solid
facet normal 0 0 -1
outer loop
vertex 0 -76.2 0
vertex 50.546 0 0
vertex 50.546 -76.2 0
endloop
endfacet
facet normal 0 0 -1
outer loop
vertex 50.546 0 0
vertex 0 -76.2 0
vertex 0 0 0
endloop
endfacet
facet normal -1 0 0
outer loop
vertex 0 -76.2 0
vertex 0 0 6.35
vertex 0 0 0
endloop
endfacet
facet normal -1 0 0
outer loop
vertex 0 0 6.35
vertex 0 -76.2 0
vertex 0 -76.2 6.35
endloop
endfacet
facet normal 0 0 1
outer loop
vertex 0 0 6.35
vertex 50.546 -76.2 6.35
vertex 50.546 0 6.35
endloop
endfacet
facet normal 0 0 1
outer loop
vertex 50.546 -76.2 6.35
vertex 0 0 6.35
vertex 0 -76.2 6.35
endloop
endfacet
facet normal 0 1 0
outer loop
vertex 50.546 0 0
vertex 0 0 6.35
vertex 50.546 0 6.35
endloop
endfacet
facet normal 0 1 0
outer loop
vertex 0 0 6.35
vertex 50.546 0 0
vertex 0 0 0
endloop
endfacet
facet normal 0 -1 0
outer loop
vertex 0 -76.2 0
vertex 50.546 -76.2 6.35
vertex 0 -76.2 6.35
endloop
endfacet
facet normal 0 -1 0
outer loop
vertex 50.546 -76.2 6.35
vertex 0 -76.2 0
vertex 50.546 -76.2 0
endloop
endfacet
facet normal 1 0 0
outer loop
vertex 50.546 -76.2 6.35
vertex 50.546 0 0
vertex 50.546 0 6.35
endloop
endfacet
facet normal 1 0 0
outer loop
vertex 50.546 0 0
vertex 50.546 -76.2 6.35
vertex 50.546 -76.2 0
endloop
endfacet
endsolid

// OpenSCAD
//OpenScadFont

//Author: Steve Miller (avrgeek on Thingiverse)
//http://www.thingiverse.com/thing:6820

/*

Usage: fnt_str(chars,char_count, block_size, height)
Example fnt_str(["H","e","l","l","o"],5,1,3);

This provides an alternate method of embedding lettering into an OpenSCAD project.  An 
open source font is exported into dxf files, and those files are linear_extruded to provide nicely 
rendered fonts.  The code is based on the bitmap font module 
(http://www.thingiverse.com/thing:2054).  The function provided by the fnt_str will map to the 
8bit_str moudule.  The block-size parameter will have no effect on the generated size of the letters.  
Make sure the "fnt-LeagueGothic" directory is contained within the directory for your project.

The font use was League Gothic from the League of Moveable Type 
(http://www.theleagueofmoveabletype.com/fonts/7-league-gothic)  This font does have variable width,
so some of the letters may look out of place.  Some manual adjustments have been made, but
OpenSCAD's immutable variables makes calculating the proper spacing difficult.  Perhaps a 
smarter person has a way of pulling this off.

Other fonts can be adapted to this module.  The Customize.txt file will contain basic instructions for
porting new fonts.



*/

/*
This work is licensed under the Creative Commons Attribution-ShareAlike 3.0 Unported License. To view a copy of this license, visit http://creativecommons.org/licenses/by-sa/3.0/; or, (b) send a letter to Creative Commons, 171 2nd Street, Suite 300, San Francisco, California, 94105, USA.
*/

//Variables
fnt_directory="fnt-LeagueGothic/";

//Test module for 
module fnt_str(chars,char_count, block_size, height) {
   //Block-size will be effectly ignored for now...may try to do something with it in the future
   char_width=5;
   echo(str("Total Width: ", char_width*char_count, "mm"));

   //Trans
   union() {
     for (count = [0:char_count-1]) {
      translate(v = [5,-2.5+count * char_width, 0])
        rotate([0,0,90]) fnt_char(chars[count], block_size, height);
     }

   }

}

module getChar(dxfString="0.dxf", height=5,scaleValue=[1,1,1]){
	//echo("Height of letter ",height);
	scale(scaleValue){
			linear_extrude(height=height, convexity=10){
				import(file=str(fnt_directory,dxfString));
			}
	}
}

module fnt_char(char, block_size, height, include_base,scaleValue=[8,8,1]) {
  //TODO: Adjust scaling factors, determine correct "block" size.
  if (char == "0") {
	  getChar("0.dxf", height,scaleValue);
  } else if (char == "1") {
	  getChar("1.dxf", height,scaleValue);
  } else if (char == "2") {
	  getChar("2.dxf", height,scaleValue);
  } else if (char == "3") {
	  getChar("3.dxf", height,scaleValue);
  } else if (char == "4") {
	  getChar("4.dxf", height,scaleValue);
  } else if (char == "5") {
	  getChar("5.dxf", height,scaleValue);
  } else if (char == "6") {
	  getChar("6.dxf", height,scaleValue);
  } else if (char == "7") {
	  getChar("7.dxf", height,scaleValue);
  } else if (char == "8") {
	  getChar("8.dxf", height,scaleValue);
  } else if (char == "9") {
	  getChar("9.dxf", height,scaleValue);
  } else if (char == "a") {
	  getChar("a-lower.dxf", height,scaleValue);
  } else if (char == "A") {
	  getChar("A.dxf", height,scaleValue);
  } else if (char == "&") {
	  getChar("amperstand.dxf", height,scaleValue);
  } else if (char == "*") {
    translate([0,2,0]) 
    		getChar("asterisk.dxf", height,scaleValue);
  } else if (char == "\\") {
	  getChar("backslash.dxf", height,scaleValue);
  } else if (char == "|") {
    translate([1.7,0,0])
    		getChar("bar.dxf", height,scaleValue);
  } else if (char == "b") {
	  getChar("b-lower.dxf", height,scaleValue);
  } else if (char == "B") {
	  getChar("B.dxf", height,scaleValue);
  } else if (char == "c") {
	  getChar("c-lower.dxf", height,scaleValue);
  } else if (char == "C") {
	  getChar("C.dxf", height,scaleValue);
  } else if (char == "-") {
    translate([1.7,4,0]) 
    		getChar("dash.dxf", height,scaleValue);
  } else if (char == "d") {
	  getChar("d-lower.dxf", height,scaleValue);
  } else if (char == "D") {
	  getChar("D.dxf", height,scaleValue);
  } else if (char == "$") {
    translate([0,-1.5,0]) 
		getChar("dollarsign.dxf", height,[scaleValue[0]-1,scaleValue[1],scaleValue[2]]);
  } else if (char == ".") {
	  getChar("dot.dxf", height,scaleValue);
  } else if (char == "''") {
    translate([0,6,0]) 
    		getChar("doublequote.dxf", height,scaleValue);
  } else if (char == "=") {
    translate([0,2.5,0]) 
				getChar("=.dxf", height,[scaleValue[0]-2,scaleValue[1],scaleValue[2]]);
  } else if (char == "_") {
	  getChar("_.dxf", height,[scaleValue[0]-2,scaleValue[1],scaleValue[2]]);
  } else if (char == ",") {
    translate([0,-1.75,0]) 
    		getChar(",.dxf", height,scaleValue);
  } else if (char == ":") {
	  getChar(":.dxf", height,scaleValue);
  } else if (char == "!") {
	  getChar("!.dxf", height,scaleValue);
  } else if (char == "(") {
	  getChar("openpar.dxf", height,scaleValue);
  } else if (char == ")") {
	  getChar("closepar.dxf", height,scaleValue);
  } else if (char == "[") {
	  getChar("[.dxf", height,scaleValue);
  } else if (char == "]") {
	  getChar("].dxf", height,scaleValue);
  } else if (char == "@") {
	  getChar("@.dxf", height,scaleValue);
  } else if (char == "#") {
	  getChar("#.dxf", height,[scaleValue[0]-3,scaleValue[1],scaleValue[2]]);
  } else if (char == "+") {
    translate([0,2,0]) 
    		getChar("+.dxf", height,scaleValue);
  } else if (char == "e") {
	  getChar("e-lower.dxf", height,scaleValue);
  } else if (char == "E") {
	  getChar("E.dxf", height,scaleValue);
  } else if (char == "f") {
	  getChar("f-lower.dxf", height,scaleValue);
  } else if (char == "F") {
	  getChar("F.dxf", height,scaleValue);
  } else if (char == "/") {
	  getChar("forwardslash.dxf", height,scaleValue);
  } else if (char == "g") {
    translate([0,-3,0]) 
    		getChar("g-lower.dxf", height,scaleValue);
  } else if (char == "G") {
	  getChar("G.dxf", height,scaleValue);
  } else if (char == ">") {
	  getChar("greaterthen.dxf", height,[scaleValue[0]-2,scaleValue[1],scaleValue[2]]);
  } else if (char == "h") {
	  getChar("h-lower.dxf", height,scaleValue);
  } else if (char == "H") {
	  getChar("H.dxf", height,scaleValue);
  } else if (char == "i") {
	  translate([1.2,0,0]) 
			  getChar("i-lower.dxf", height,scaleValue);
  } else if (char == "I") {
	  getChar("I.dxf", height,scaleValue);
  } else if (char == "j") {
     translate([0,-2.5,0])
    		 getChar("j-lower.dxf", height,scaleValue);
  } else if (char == "J") {
	  getChar("J.dxf", height,scaleValue);
  } else if (char == "k") {
	  getChar("k-lower.dxf", height,scaleValue);
  } else if (char == "K") {
	  getChar("K.dxf", height,scaleValue);
  } else if (char == "l") {
	  translate([1.2,0,0]) 
			  getChar("l-lower.dxf", height,scaleValue);
  } else if (char == "L") {
	  getChar("L.dxf", height,scaleValue);
  } else if (char == "<") {
	  getChar("lessthen.dxf", height,[scaleValue[0]-2,scaleValue[1],scaleValue[2]]);
  } else if (char == "m") {
	  getChar("m-lower.dxf", height,[scaleValue[0]-1,scaleValue[1],scaleValue[2]]);
  } else if (char == "M") {
	  getChar("M.dxf", height,[scaleValue[0]-1,scaleValue[1],scaleValue[2]]);
  } else if (char == "n") {
	  getChar("n-lower.dxf", height,scaleValue);
  } else if (char == "N") {
	getChar("N.dxf", height,[scaleValue[0]-1,scaleValue[1],scaleValue[2]]);
  } else if (char == "o") {
	  getChar("o-lower.dxf", height,scaleValue);
  } else if (char == "O") {
	  getChar("O.dxf", height,scaleValue);
  } else if (char == "p") {
     translate([0,-2.5,0]) 
    		 getChar("p-lower.dxf", height,scaleValue);
  } else if (char == "P") {
	  getChar("P.dxf", height,scaleValue);
  } else if (char == "%") {
	  getChar("percent.dxf", height,[scaleValue[0]-1.75,scaleValue[1],scaleValue[2]]);
  } else if (char == "q") {
     translate([0,-2.5,0]) 
    		 getChar("q-lower.dxf", height,scaleValue);
  } else if (char == "Q") {
     translate([0,-0.5,0]) 
    		 getChar("Q.dxf", height,scaleValue);
  } else if (char == "?") {
	  getChar("question.dxf", height,scaleValue);
  } else if (char == "r") {
	  getChar("r-lower.dxf", height,scaleValue);
  } else if (char == "R") {
	  getChar("R.dxf", height,scaleValue);
  } else if (char == "s") {
	  getChar("s-lower.dxf", height,scaleValue);
  } else if (char == "S") {
	  getChar("S.dxf", height,scaleValue);
  } else if (char == "'") {
    translate([0,6,0]) 
    		getChar("singlequote.dxf", height,scaleValue);
  } else if (char == "t") {
	  getChar("t-lower.dxf", height,scaleValue);
  } else if (char == "T") {
	  getChar("T.dxf", height,scaleValue);
  } else if (char == "u") {
	  getChar("u-lower.dxf", height,scaleValue);
  } else if (char == "U") {
	  getChar("U.dxf", height,scaleValue);
  } else if (char == "v") {
	  getChar("v-lower.dxf", height,scaleValue);
  } else if (char == "V") {
	  getChar("V.dxf", height,scaleValue);
  } else if (char == "w") {
	  getChar("w-lower.dxf", height,[scaleValue[0]-1,scaleValue[1],scaleValue[2]]);
  } else if (char == "W") {
	  getChar("W.dxf", height,[scaleValue[0]-2,scaleValue[1],scaleValue[2]]);
  } else if (char == "x") {
	  getChar("x-lower.dxf", height,scaleValue);
  } else if (char == "X") {
	  getChar("X.dxf", height,[scaleValue[0]-1,scaleValue[1],scaleValue[2]]);
  } else if (char == "y") {
     translate([0,-2.5,0]) 
    		 getChar("y-lower.dxf", height,scaleValue);
  } else if (char == "Y") {
	  getChar("Y.dxf", height,scaleValue);
  } else if (char == "z") {
	  getChar("z-lower.dxf", height,scaleValue);
  } else if (char == "Z") {
	  getChar("Z.dxf", height,scaleValue);
  } else {
    echo ("Unknown charachter: ",char);
  }

}

module fnt_test() {
    fnt_str(["A", "B", "C", "D", "E", "F", "G", "H", "I", "J", "K", "L", "M", "N", "O", "P", "Q", "R", "S", "T", "U", "V", "W", "X", "Y","Z"],26,1,2);

   translate([15,0,0]) 
		fnt_str(["a", "b", "c", "d", "e", "f", "g", "h", "i", "j", "k", "l", "m", "n", "o", "p", "q", "r", "s", "t", "u", "v", "w", "x", "y", "z"],26,1,2);

   translate([30,0,0]) 
		fnt_str(["0","1","2","3","4","5","6","7","8","9","+","-",":",".",",","?","=","*","!","''","#","$","%","&","@","'"],26,1,2);
	translate([45,0,0]) 
		fnt_str(["(",")","<",">","[","]","/","\\","_","|"],10,1,2);
}

module makeWord_LeagueGothic(wordString=" ",word_height=2.0, baseThickness = 2,size=[60,10],char_width=5){
	   //Block-size will be effectly ignored for now...may try to do something with it in the future

	   char_count = len(wordString);
	   //echo(str("Total Width: ", char_width*char_count, "mm"));
	   block_size=1;
	   //Trans
	    translate([0,0,baseThickness*2]){
		   rotate([180,0,0]){
			   union() {
					for (count = [0:char_count-1]) {
						translate(v = [char_width*2,count * char_width, 0])
								rotate([0,0,90]) 
									fnt_char(wordString[count], block_size, word_height);
					}
					translate([0,0,baseThickness])
						cube([char_width*2, char_width*char_count,baseThickness ]);
		
			   }
		   }
	   }
	   
}


module makeWords_LeagueGothic(words=[" "],word_height=2.0,size=[100,100]) {
	char_width=5;
	startingy = len(words[0])*char_width;
	echo("Startiny y",startingy );
	startingx = char_width*2*len(words);
	echo("Startiny x",startingx );
	y=size[0]/startingy;
	x=size[1]/startingx;	
	echo(size);
	echo(x);
	echo(y);
	echo(word_height);

	
	scale([x,y,1]){
		union(){
			for(i=[0:(len(words)-1)]){
			  translate([i*9.9,0,0]){
				  makeWord_LeagueGothic(wordString=words[i],word_height=word_height,char_width=char_width,baseThickness=word_height);
			  }
			}	
		}
	}
}

inpitSize=[3*25.4,2*25.4];

//cube([inpitSize[0],inpitSize[1],2*25.4]);
#makeWords_LeagueGothic(words=["Unfortunante","Publications"],word_height=.25*25.4,size=inpitSize);
